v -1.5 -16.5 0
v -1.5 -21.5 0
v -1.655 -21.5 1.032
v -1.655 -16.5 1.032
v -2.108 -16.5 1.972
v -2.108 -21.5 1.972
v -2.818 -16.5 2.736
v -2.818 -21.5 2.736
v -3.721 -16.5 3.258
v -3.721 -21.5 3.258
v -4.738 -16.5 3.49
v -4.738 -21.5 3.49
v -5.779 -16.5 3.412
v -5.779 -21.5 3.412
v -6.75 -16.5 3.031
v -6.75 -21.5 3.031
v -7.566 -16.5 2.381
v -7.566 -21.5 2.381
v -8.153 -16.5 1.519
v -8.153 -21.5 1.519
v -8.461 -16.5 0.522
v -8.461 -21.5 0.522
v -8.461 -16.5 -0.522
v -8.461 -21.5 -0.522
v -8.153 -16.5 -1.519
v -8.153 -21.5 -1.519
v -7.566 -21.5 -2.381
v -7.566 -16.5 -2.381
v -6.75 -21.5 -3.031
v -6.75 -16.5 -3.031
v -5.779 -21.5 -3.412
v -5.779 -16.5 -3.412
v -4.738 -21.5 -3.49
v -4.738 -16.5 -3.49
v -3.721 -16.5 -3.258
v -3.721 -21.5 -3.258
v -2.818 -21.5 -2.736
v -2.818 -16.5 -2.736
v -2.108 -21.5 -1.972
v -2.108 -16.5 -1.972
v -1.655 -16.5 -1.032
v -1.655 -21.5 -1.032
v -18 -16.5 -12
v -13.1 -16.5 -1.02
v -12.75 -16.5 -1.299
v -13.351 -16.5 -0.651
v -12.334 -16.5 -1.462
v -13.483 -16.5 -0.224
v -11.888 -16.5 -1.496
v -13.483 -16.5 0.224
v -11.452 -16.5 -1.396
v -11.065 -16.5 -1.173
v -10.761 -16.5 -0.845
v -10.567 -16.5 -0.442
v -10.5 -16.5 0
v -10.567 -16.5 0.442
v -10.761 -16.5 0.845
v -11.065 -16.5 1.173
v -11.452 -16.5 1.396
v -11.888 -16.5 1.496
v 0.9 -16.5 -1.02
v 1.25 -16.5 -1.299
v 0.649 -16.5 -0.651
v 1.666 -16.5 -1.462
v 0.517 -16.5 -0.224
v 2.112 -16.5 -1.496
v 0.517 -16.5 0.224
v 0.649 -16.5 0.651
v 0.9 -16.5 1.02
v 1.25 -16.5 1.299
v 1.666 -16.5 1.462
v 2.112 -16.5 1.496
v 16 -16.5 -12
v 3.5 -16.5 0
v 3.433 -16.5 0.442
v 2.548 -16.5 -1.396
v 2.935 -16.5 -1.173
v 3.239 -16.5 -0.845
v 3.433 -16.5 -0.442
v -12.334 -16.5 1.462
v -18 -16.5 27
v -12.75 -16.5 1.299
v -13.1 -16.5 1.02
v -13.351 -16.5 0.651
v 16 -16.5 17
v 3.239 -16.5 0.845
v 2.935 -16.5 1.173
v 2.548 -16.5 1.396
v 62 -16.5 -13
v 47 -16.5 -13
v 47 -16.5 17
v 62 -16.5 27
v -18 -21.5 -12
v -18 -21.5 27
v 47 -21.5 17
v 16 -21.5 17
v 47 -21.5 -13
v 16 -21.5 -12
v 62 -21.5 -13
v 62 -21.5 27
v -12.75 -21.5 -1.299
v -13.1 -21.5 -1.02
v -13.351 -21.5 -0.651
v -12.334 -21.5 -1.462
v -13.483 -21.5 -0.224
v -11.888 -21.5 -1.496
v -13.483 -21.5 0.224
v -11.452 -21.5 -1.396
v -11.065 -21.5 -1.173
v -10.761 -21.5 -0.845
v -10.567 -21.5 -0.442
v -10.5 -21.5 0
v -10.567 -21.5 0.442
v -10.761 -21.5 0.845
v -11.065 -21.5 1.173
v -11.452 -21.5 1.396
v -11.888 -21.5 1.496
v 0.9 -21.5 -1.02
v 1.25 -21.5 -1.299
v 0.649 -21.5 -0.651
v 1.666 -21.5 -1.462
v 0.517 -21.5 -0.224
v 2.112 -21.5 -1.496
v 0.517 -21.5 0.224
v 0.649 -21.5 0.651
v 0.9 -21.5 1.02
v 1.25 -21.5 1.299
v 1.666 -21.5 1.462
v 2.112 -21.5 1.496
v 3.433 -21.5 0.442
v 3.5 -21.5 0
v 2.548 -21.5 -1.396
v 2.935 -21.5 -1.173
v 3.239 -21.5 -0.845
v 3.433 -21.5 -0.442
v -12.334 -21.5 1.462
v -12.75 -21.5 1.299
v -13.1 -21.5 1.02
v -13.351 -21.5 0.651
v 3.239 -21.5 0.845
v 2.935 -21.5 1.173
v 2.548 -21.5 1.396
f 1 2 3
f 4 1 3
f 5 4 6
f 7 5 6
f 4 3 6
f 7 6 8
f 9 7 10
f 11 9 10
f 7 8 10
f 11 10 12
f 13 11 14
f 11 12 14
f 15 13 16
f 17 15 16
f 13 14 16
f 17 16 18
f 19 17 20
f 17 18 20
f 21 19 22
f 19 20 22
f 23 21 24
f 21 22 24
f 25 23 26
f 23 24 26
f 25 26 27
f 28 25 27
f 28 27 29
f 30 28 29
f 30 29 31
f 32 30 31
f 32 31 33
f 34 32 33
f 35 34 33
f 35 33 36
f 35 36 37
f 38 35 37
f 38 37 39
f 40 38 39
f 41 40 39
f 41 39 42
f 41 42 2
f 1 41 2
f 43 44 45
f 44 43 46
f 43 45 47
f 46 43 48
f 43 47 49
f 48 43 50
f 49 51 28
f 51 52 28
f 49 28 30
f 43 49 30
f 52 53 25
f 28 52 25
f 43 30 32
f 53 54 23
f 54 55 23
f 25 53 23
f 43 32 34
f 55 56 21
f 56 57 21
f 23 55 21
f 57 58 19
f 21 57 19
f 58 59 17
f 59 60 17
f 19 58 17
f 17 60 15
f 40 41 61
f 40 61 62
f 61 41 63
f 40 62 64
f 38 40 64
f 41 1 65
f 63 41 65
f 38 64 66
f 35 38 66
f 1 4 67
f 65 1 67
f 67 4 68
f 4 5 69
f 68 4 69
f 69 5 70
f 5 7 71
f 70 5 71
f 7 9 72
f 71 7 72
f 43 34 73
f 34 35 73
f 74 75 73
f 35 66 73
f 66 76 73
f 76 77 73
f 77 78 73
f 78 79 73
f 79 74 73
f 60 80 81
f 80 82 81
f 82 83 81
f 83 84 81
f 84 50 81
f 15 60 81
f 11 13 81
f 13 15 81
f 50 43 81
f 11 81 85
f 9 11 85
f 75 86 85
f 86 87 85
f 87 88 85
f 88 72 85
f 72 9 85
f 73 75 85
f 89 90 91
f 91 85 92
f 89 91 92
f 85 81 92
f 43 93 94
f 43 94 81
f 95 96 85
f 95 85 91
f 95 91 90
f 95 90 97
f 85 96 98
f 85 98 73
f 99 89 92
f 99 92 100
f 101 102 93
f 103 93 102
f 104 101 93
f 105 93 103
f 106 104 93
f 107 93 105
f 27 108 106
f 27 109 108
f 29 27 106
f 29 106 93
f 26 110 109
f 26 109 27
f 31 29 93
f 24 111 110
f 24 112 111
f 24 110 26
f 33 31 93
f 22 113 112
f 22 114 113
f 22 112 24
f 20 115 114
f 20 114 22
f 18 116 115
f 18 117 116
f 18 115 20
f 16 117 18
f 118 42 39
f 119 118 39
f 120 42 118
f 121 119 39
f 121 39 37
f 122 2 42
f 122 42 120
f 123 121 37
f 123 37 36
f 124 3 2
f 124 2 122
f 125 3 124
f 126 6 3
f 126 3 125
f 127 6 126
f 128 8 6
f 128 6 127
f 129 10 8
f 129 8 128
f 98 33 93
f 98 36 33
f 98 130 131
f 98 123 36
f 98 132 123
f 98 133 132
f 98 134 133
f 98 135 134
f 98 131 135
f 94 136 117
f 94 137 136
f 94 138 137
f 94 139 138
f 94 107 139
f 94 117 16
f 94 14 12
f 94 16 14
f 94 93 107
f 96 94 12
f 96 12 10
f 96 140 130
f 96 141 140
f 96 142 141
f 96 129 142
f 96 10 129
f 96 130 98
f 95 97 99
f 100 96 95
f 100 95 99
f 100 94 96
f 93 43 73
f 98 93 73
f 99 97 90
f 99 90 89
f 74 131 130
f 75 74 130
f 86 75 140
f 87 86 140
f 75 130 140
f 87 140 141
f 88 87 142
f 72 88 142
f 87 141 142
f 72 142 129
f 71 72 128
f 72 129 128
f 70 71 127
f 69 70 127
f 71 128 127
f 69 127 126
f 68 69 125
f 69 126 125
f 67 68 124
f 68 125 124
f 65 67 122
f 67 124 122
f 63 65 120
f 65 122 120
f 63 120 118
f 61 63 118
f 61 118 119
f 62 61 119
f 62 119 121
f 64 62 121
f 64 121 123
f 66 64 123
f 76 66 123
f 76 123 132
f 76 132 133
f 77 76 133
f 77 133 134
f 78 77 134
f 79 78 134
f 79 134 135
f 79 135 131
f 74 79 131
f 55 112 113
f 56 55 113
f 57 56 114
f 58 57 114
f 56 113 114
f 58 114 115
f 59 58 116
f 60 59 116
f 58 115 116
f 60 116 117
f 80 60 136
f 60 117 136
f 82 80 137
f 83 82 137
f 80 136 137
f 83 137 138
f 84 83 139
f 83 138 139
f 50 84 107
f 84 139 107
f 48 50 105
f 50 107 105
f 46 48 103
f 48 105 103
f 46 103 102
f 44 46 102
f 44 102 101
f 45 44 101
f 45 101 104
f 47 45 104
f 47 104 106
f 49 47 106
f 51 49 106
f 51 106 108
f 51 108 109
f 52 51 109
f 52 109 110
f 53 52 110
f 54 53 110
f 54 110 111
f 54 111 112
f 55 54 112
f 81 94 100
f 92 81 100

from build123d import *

# Parameters (mm, degrees)
F0_W      = 36
F0_H      = 24
F1_DEPTH  = 21.5
F3_DEPTH  = 4
F4_R      = 1.5
F5_DEPTH  = 6
F6_W      = 2
F6_H      = 22
F6_R      = 1.75
F7_DEPTH  = 26.001
F8_R      = 3.5
F9_DEPTH  = 15
F10_R     = 1.5
F11_DEPTH = 6
F12_R     = 1.5
F13_DEPTH = 6
F15_DEPTH = 24.001
F16_W     = 2
F16_H     = 5
F17_DEPTH = 25
F18_W     = 34
F18_H     = 5
F19_DEPTH = 25
F20_W     = 80
F20_H     = 20
F21_DEPTH = 5
F22_W     = 15
F22_H     = 5
F23_DEPTH = 30
F24_W     = 80
F24_H     = 10
F25_DEPTH = 5.001


with BuildPart() as f1:
    # F0 (on Front) → F1 (new body)
    with BuildSketch(Plane.XZ):
        Rectangle(F0_W, F0_H)
    extrude(amount=F1_DEPTH)

    # F2 (on face) → F3 (join)
    with BuildSketch(Plane(origin=(-18, 0, 0), x_dir=(0, -1, 0), z_dir=(-1, 0, 0))):
        Polygon((0, -4), (0, 4), (-4.5, 4), (-4.5, 1.127949), (-3.5, 0.86), (-2.3, 0.86), (-2.3, -0.86), (-3.5, -0.86), (-4.5, -1.127949), (-4.5, -4), align=None)
    extrude(amount=-F3_DEPTH)

    # F4 (on face) → F5 (cut)
    with BuildSketch(Plane.XZ.offset(21.5)):
        with Locations((-12, 0)):
            Circle(F4_R)
        with Locations((2, 0)):
            Circle(F4_R)
    extrude(amount=-F5_DEPTH, mode=Mode.SUBTRACT)

    # F6 (on face) → F7 (cut, through all)
    with BuildSketch(Plane.XZ.offset(21.5)):
        with Locations((17, 1)):
            Rectangle(F6_W, F6_H)
        with Locations((-5, 0)):
            Circle(F6_R)
    extrude(amount=-F7_DEPTH, mode=Mode.SUBTRACT)

    # F8 (on face) → F9 (cut)
    with BuildSketch(Plane.XZ.offset(21.5)):
        with Locations((-5, 0)):
            Circle(F8_R)
    extrude(amount=-F9_DEPTH, mode=Mode.SUBTRACT)

    # F10 (on face) → F11 (cut)
    with BuildSketch(Plane(origin=(0, 0, -12), x_dir=(1, 0, 0), z_dir=(0, 0, -1))):
        with Locations((12, 9.5)):
            Circle(F10_R)
    extrude(amount=-F11_DEPTH, mode=Mode.SUBTRACT)

    # F12 (on face) → F13 (cut)
    with BuildSketch(Plane(origin=(0, 0, 0), x_dir=(-1, 0, 0), z_dir=(0, 1, 0))):
        with Locations((-12, 0)):
            Circle(F12_R)
    extrude(amount=-F13_DEPTH, mode=Mode.SUBTRACT)

    # F14 (on face) → F15 (cut, through all)
    with BuildSketch(Plane.XY.offset(12)):
        Polygon((-18, 4.5), (-18, -16.5), (18, -16.5), (18, 0), (16, 0), (-14, 0), (-14, 4.5), align=None)
    extrude(amount=-F15_DEPTH, mode=Mode.SUBTRACT)

    # F16 (on face) → F17 (cut)
    with BuildSketch(Plane.XY.offset(-10)):
        with Locations((17, -19)):
            Rectangle(F16_W, F16_H)
    extrude(amount=-F17_DEPTH, mode=Mode.SUBTRACT)

    # F18 (on face) → F19 (join)
    with BuildSketch(Plane.XY.offset(12)):
        with Locations((-1, -19)):
            Rectangle(F18_W, F18_H)
    extrude(amount=F19_DEPTH)

    # F20 (on face) → F21 (join)
    with BuildSketch(Plane.XZ.offset(21.5)):
        with Locations((22, 27)):
            Rectangle(F20_W, F20_H)
    extrude(amount=-F21_DEPTH)

    # F22 (on face) → F23 (join)
    with BuildSketch(Plane(origin=(0, 0, 17), x_dir=(1, 0, 0), z_dir=(0, 0, -1))):
        with Locations((54.5, 19)):
            Rectangle(F22_W, F22_H)
    extrude(amount=F23_DEPTH)

    # F24 (on face) → F25 (cut, through all)
    with BuildSketch(Plane.XZ.offset(21.5)):
        with Locations((22, 32)):
            Rectangle(F24_W, F24_H)
    extrude(amount=-F25_DEPTH, mode=Mode.SUBTRACT)


solid = f1.part
